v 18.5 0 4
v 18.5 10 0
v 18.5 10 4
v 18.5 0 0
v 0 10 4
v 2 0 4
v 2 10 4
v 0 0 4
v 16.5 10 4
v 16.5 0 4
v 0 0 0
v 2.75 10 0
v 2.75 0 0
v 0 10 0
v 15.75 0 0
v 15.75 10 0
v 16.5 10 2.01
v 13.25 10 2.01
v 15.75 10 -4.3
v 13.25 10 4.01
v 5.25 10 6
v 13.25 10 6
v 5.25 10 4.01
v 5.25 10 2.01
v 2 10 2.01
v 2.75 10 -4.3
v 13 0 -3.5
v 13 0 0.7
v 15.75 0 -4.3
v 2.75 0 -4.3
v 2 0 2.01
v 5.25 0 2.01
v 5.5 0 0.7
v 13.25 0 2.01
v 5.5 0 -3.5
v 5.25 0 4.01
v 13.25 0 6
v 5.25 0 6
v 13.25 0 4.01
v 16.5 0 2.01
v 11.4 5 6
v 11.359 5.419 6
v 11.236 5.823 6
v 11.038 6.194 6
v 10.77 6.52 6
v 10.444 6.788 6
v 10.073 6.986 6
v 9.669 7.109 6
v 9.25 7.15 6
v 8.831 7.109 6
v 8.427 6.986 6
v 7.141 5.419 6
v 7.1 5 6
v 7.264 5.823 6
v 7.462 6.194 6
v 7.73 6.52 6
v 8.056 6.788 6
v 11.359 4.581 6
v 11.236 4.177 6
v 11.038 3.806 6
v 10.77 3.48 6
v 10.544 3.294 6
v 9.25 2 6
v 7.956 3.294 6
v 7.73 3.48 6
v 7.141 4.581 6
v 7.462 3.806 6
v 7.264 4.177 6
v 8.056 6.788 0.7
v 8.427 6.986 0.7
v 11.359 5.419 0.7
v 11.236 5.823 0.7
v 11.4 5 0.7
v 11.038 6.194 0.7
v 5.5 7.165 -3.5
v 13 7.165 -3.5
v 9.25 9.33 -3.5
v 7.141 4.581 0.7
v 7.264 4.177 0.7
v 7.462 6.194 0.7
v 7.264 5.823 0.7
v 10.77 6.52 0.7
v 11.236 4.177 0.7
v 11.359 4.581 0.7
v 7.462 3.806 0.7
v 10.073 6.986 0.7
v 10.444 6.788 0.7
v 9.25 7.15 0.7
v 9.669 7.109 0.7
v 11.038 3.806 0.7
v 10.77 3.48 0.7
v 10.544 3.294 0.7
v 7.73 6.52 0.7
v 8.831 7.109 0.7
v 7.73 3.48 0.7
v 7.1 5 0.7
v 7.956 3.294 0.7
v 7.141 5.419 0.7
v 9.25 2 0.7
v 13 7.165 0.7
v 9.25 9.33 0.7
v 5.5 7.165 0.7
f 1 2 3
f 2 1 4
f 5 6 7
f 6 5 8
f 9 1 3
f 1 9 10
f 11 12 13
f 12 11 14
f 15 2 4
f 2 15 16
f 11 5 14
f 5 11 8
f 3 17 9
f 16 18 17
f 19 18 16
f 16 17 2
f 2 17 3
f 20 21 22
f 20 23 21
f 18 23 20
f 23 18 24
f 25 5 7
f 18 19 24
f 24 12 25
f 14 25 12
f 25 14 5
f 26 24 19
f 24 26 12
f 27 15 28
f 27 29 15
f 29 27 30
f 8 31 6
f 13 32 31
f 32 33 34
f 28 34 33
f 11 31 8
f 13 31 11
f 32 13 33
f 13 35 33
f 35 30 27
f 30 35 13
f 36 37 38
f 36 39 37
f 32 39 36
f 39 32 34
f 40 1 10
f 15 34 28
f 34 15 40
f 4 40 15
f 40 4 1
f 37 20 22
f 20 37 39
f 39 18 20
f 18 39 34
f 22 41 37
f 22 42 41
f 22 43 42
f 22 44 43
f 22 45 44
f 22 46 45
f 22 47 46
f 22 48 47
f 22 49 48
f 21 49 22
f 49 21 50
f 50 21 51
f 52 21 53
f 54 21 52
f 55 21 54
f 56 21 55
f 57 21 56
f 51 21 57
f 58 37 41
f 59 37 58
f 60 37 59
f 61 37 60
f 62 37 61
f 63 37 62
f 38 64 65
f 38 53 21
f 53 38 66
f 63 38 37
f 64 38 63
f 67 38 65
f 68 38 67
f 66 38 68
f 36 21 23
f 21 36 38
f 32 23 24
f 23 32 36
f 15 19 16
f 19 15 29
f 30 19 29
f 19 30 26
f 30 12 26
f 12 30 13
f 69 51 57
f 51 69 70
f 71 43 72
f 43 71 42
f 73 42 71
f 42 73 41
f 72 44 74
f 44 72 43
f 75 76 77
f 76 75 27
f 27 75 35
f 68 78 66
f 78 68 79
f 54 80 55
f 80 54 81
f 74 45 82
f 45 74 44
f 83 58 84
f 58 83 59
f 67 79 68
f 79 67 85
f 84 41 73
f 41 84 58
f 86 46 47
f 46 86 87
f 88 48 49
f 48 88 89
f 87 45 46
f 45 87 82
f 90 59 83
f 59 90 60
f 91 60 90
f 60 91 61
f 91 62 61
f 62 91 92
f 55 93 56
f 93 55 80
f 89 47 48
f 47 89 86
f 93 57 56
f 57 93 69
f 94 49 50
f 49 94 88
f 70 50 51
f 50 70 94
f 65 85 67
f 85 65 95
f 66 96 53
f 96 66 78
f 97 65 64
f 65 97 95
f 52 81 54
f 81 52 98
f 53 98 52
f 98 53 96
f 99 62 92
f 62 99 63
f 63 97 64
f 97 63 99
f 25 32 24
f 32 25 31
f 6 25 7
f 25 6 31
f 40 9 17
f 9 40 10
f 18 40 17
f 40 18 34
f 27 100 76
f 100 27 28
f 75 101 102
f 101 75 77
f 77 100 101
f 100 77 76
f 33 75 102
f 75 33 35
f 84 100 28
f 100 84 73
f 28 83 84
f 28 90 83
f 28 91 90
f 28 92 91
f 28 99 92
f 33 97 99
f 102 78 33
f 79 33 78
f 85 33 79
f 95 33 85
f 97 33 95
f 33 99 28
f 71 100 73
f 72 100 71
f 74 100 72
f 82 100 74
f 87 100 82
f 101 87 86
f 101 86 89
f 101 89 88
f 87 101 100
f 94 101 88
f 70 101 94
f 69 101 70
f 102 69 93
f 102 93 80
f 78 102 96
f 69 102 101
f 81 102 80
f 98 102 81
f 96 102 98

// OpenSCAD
// T-slot Slide Nut Extension Parameters
neck_width = 8;    // Width of the neck (mm)
neck_height = 4;   // Height of the neck (mm)
t_width = 20-1.5;      // Total width of the T (mm)
tail_height = 2;   // Height the tails extend upward (mm)
total_height = 6;  // Total height of the part (mm)
length = 10;       // Length of the extension along the slot (mm)
neck_extension = 2; // Additional height for the neck extension
e = 0.01;
tail_width = 2;
// Hole and nut parameters
m4_diameter = 4.3;  // Slightly larger for 3D printing tolerances
m4_hole_depth = 9.5;  // Depth of the M4 hole (mm)
m4_nut_width = 7.5;   // Width across flats for an M4 nut
m4_nut_height = 4.2; // Height of an M4 nut
m4_nut_insertion_width = m4_nut_width; // Width for insertion
m4_nut_insertion_height = m4_nut_height; // Add some clearance for insertion
// Calculate derived dimensions
wing_width = (t_width - neck_width) / 2 - tail_width;  // Width of each "wing" of the T
bottom_extension = 4.3;
bottom_ext_w = 13;
// Create a teardrop shape for better printability along Y axis
module teardrop(d, h) {
    union() {
        // Main cylinder part
        cylinder(d=d, h=h, $fn=32);

        // Triangular top for printability
        translate([0, -3, 0])
            rotate([0, 0, 45])  // Rotate to align with print orientation
            linear_extrude(height=h)
                polygon(points=[[0,0], [d/2,0], [0,d/2]]);
    }
}
module t_slot_extension() {
    difference() {
        union() {
            // Main body - a cuboid with reduced height
            cube([t_width, length, total_height - neck_extension]);

            // Add the extension to the neck
            translate([(t_width - neck_width)/2, 0, total_height - neck_extension])
                cube([neck_width, length, neck_extension]);

            // Bottom extension
            translate([(t_width - bottom_ext_w)/2, 0, -bottom_extension])
                cube([bottom_ext_w, length, bottom_extension]);
        }

        // Cut out the undercuts on both sides
        translate([tail_width, -e, neck_height+e - neck_extension])
            cube([wing_width, length+2*e, tail_height]);

        translate([t_width - wing_width-tail_width, -e, neck_height+e - neck_extension])
            cube([wing_width, length+2*e, tail_height]);

        // M4 teardrop hole from the top center
        translate([t_width/2, length/2, total_height - m4_hole_depth])
            rotate([0, 0, 0])  // Rotate for Y-axis printing orientation
            teardrop(d=m4_diameter, h=m4_hole_depth+e);

        // Nut trap - hexagonal cutout
        translate([t_width/2, length/2, total_height - m4_hole_depth])
            rotate([0, 0, 30])  // Rotate for better printing of the hexagon
            cylinder(h=m4_nut_height, d=m4_nut_width/cos(30), $fn=6);  // Hexagon for the nut

        // Rectangular slot for nut insertion from the side
        translate([t_width/2 - m4_nut_insertion_width/2, -e, total_height - m4_hole_depth])
            cube([m4_nut_insertion_width, length/2 + e, m4_nut_insertion_height]);
    }
}
t_slot_extension();
